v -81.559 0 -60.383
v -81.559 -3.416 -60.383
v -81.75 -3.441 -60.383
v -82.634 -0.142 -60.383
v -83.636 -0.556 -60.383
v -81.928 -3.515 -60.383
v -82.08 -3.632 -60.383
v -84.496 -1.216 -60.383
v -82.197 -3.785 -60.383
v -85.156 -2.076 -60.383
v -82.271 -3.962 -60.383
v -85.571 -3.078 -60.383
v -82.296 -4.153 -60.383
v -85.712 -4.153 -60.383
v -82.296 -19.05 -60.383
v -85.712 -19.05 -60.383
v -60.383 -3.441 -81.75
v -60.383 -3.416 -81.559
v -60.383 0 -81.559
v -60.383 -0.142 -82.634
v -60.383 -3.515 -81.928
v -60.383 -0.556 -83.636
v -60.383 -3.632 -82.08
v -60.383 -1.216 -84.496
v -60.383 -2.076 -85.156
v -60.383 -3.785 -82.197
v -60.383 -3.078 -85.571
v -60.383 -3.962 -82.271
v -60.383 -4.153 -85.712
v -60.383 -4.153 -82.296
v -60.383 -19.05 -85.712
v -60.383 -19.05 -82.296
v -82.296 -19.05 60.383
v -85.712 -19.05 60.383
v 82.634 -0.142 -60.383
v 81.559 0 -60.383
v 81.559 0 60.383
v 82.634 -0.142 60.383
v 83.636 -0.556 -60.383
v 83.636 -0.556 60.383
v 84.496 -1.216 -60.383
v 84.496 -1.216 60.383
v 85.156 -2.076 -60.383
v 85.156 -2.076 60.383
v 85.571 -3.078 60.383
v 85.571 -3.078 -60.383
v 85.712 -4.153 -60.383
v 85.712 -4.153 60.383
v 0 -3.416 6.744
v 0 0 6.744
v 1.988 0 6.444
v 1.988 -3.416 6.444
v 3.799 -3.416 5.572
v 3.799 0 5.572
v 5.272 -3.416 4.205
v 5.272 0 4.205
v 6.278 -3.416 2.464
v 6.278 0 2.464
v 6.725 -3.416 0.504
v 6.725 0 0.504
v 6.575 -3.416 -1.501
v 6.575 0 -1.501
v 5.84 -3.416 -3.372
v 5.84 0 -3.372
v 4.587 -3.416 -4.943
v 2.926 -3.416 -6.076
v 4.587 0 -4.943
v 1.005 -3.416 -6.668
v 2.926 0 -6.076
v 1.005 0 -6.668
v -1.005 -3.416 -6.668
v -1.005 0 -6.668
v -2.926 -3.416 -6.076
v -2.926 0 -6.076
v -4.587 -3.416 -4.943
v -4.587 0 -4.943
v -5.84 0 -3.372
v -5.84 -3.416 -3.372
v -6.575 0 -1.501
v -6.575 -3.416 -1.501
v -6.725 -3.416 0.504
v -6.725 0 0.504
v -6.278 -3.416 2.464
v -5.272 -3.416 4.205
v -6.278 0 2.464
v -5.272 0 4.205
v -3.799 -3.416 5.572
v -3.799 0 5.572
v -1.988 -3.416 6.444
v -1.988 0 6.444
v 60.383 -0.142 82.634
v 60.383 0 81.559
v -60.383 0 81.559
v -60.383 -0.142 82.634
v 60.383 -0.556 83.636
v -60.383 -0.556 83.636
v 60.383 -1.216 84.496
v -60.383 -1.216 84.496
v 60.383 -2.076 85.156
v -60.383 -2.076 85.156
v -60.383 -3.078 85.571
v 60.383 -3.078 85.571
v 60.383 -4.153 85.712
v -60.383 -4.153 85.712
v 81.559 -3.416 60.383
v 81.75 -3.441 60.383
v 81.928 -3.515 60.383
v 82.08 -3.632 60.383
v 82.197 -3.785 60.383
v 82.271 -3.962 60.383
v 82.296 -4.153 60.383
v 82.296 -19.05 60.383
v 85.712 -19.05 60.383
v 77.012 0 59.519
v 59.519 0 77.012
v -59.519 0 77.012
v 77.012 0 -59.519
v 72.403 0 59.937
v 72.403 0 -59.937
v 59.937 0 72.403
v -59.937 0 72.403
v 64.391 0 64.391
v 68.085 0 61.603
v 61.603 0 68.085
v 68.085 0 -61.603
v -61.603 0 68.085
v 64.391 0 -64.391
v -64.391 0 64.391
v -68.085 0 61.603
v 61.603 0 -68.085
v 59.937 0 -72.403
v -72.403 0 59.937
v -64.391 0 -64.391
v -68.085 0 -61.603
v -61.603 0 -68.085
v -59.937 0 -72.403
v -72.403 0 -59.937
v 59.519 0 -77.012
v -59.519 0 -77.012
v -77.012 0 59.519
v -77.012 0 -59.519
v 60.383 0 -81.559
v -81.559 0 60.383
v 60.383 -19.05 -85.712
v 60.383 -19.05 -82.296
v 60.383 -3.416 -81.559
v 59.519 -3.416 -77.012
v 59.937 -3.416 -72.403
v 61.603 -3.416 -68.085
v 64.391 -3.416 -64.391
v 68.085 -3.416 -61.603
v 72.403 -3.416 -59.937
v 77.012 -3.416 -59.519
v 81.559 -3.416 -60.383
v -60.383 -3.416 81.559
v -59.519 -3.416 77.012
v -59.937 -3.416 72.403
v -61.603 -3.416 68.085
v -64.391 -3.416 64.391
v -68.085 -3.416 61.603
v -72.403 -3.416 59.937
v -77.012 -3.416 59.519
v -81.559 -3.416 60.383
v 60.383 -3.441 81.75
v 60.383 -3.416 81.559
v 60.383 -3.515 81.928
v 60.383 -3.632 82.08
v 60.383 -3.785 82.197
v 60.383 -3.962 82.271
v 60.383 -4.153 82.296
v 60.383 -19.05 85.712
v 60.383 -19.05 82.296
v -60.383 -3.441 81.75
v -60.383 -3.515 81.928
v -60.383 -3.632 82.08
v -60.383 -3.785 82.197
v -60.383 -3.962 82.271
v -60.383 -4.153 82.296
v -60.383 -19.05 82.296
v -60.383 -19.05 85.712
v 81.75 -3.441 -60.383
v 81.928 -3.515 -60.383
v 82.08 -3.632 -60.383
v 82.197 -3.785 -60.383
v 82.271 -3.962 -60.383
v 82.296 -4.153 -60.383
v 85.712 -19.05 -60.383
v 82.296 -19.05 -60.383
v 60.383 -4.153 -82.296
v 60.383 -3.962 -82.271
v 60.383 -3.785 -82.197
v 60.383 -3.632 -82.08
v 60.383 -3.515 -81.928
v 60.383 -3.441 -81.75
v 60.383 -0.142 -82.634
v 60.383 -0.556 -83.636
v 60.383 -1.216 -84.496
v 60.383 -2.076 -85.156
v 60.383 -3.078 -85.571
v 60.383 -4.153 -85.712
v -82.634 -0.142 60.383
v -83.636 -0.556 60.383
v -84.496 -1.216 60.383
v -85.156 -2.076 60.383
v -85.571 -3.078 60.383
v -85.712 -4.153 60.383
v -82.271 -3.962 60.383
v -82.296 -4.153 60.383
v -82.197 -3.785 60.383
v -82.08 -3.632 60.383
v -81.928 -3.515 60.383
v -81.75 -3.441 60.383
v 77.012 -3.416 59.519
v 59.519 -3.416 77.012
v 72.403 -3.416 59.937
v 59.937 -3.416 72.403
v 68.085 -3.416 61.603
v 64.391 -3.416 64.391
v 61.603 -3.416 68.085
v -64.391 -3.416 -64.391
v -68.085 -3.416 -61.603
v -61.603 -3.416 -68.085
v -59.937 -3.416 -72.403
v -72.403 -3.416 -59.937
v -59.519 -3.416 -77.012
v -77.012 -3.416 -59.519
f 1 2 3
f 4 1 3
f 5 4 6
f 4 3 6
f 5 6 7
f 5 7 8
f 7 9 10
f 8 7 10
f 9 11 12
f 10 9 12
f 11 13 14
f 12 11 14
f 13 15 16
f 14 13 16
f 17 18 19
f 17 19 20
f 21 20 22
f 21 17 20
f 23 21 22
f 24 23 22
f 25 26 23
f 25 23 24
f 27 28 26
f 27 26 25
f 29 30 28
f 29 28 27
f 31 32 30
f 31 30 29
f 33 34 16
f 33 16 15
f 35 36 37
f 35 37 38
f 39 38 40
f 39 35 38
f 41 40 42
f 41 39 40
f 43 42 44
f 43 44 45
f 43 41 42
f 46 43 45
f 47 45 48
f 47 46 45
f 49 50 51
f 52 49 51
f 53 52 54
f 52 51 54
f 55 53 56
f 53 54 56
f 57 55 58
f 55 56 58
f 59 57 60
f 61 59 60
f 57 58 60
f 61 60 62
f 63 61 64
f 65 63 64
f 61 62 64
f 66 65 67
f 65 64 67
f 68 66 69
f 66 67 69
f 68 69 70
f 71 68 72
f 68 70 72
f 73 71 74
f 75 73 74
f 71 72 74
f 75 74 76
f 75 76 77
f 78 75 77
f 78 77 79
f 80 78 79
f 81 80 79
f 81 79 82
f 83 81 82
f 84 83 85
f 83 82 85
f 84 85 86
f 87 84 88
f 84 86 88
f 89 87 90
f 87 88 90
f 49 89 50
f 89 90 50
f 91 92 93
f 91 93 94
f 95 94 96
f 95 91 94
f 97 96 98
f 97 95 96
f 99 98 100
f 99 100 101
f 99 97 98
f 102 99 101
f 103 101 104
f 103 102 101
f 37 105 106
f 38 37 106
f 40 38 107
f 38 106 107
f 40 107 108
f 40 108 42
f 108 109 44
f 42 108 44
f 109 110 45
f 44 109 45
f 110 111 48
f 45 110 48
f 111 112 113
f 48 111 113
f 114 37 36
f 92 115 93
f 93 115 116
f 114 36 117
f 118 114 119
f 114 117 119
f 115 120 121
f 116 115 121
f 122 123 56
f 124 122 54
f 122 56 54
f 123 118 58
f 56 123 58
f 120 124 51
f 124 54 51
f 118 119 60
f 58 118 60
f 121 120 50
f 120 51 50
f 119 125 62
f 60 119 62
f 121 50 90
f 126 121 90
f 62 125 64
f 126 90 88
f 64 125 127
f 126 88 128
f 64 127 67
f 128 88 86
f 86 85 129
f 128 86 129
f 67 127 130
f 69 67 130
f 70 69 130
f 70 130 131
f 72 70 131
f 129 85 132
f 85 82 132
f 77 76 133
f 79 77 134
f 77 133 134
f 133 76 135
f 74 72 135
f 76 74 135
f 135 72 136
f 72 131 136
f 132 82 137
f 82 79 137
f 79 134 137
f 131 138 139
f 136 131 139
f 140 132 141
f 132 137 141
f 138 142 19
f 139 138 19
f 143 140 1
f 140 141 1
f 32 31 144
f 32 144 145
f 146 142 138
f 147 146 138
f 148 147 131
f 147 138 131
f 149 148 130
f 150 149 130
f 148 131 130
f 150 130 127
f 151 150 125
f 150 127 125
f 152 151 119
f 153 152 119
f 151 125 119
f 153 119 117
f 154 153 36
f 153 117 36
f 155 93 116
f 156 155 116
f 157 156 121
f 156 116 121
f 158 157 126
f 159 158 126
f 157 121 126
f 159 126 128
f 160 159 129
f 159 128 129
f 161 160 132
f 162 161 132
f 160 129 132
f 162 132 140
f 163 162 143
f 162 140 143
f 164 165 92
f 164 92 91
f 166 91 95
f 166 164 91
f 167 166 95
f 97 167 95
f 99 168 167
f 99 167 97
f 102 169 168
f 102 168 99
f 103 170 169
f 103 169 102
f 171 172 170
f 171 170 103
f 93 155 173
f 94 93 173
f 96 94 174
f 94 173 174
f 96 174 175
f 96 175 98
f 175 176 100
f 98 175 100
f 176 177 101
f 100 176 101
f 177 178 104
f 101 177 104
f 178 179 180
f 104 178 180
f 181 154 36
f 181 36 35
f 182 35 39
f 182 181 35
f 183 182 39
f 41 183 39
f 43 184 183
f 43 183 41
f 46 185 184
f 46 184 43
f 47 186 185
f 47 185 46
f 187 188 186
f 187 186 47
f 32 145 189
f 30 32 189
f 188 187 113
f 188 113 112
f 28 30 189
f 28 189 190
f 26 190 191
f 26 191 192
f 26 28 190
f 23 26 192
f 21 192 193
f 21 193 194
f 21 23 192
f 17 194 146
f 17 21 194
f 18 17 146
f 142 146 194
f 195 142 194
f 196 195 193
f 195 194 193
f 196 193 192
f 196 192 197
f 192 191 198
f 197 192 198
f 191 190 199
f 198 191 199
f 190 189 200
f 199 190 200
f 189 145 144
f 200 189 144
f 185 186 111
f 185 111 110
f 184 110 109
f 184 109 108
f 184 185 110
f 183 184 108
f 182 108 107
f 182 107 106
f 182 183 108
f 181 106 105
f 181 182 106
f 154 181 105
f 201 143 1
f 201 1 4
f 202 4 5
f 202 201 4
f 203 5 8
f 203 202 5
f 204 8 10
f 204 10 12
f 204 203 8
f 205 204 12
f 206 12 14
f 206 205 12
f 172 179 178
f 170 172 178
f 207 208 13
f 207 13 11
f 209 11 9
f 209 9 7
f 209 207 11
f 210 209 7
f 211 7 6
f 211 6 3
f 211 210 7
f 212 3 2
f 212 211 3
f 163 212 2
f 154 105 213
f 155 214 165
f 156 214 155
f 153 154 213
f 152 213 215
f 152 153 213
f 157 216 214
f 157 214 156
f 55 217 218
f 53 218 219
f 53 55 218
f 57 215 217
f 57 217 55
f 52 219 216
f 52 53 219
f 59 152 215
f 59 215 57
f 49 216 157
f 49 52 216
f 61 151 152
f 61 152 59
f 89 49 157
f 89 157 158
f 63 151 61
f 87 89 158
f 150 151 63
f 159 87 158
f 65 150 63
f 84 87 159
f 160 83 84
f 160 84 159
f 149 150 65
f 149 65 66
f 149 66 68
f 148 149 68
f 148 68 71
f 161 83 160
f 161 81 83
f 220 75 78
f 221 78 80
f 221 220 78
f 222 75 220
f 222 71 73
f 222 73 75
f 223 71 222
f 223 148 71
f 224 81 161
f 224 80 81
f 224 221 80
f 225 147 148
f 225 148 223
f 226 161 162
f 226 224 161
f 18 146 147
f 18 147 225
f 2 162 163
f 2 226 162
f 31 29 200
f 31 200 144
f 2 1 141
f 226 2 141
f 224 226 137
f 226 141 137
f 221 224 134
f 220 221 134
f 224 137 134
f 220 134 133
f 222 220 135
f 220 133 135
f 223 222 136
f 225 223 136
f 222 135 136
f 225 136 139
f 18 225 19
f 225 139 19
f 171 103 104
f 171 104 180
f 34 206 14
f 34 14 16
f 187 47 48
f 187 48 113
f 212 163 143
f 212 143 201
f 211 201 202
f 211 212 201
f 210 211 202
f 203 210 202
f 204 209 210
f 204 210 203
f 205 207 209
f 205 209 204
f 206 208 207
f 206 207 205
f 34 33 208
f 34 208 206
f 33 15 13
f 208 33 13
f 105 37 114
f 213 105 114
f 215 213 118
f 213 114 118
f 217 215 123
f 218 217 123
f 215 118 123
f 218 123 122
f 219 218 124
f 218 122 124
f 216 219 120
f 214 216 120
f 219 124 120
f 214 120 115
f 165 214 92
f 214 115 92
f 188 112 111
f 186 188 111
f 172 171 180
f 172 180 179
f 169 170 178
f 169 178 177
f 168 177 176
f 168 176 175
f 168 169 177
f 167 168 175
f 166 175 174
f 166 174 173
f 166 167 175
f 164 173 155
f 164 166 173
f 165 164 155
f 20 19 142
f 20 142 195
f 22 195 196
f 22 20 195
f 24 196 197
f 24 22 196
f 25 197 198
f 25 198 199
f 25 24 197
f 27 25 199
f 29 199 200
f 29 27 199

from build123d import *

# Parameters (mm, degrees)
SKETCH3_R                 = 6.7437
BASE_FLANGE1_DEPTH        = 3.4163
EDGE_FLANGE1_DEPTH        = 120.765617952
EDGE_FLANGE1_BEND_DEPTH   = 120.765617952
EDGE_FLANGE1_BEND_2_DEPTH = 120.765617952
EDGE_FLANGE1_BEND_3_DEPTH = 120.765617952


# Sheet-metal steps are written as plain solids
with BuildPart() as part:
    # Sketch3 → Base-Flange1 (new body)
    with BuildSketch(Plane(origin=(0, 0, 0), x_dir=(1, 0, 0), z_dir=(0, 1, 0))):
        with BuildLine():
            Line((-60.382808976, 81.5594), (60.382808976, 81.5594))
            ThreePointArc((60.382808976, 81.5594), (64.390963201, 64.390963201), (81.5594, 60.382808976))
            Line((81.5594, 60.382808976), (81.5594, -60.382808976))
            ThreePointArc((81.5594, -60.382808976), (64.390963201, -64.390963201), (60.382808976, -81.5594))
            Line((60.382808976, -81.5594), (-60.382808976, -81.5594))
            ThreePointArc((-60.382808976, -81.5594), (-64.390963201, -64.390963201), (-81.5594, -60.382808976))
            Line((-81.5594, -60.382808976), (-81.5594, 60.382808976))
            ThreePointArc((-81.5594, 60.382808976), (-64.390963201, 64.390963201), (-60.382808976, 81.5594))
        make_face()
        with Locations(Location((0, 0, 0), (0, 0, 270))):
            Circle(SKETCH3_R, mode=Mode.SUBTRACT)
    extrude(amount=-BASE_FLANGE1_DEPTH)

    # Edge-Flange1 section (across the edge) → Edge-Flange1 (add)
    with BuildSketch(Plane(origin=(60.382808976, -3.4163, 82.296), x_dir=(0, 0, -1), z_dir=(-1, 0, 0))):
        with BuildLine():
            Line((-3.4163, 0.7366), (-3.4163, 15.6337))
            Line((-3.4163, 15.6337), (0, 15.6337))
            Line((0, 15.6337), (0, 0.7366))
            ThreePointArc((0, 0.7366), (0.215745145, 0.215745145), (0.7366, 0))
            Line((0.7366, 0), (0.7366, -3.4163))
            ThreePointArc((0.7366, -3.4163), (-2.199943752, -2.199943752), (-3.4163, 0.7366))
        make_face()
    extrude(amount=EDGE_FLANGE1_DEPTH)

    # Edge-Flange1 section 2 (across the edge) → Edge-Flange1 bend (add)
    with BuildSketch(Plane(origin=(82.296, -3.4163, -60.382808976), x_dir=(-1, 0, 0), z_dir=(0, 0, 1))):
        with BuildLine():
            Line((-3.4163, 0.7366), (-3.4163, 15.6337))
            Line((-3.4163, 15.6337), (0, 15.6337))
            Line((0, 15.6337), (0, 0.7366))
            ThreePointArc((0, 0.7366), (0.215745145, 0.215745145), (0.7366, 0))
            Line((0.7366, 0), (0.7366, -3.4163))
            ThreePointArc((0.7366, -3.4163), (-2.199943752, -2.199943752), (-3.4163, 0.7366))
        make_face()
    extrude(amount=EDGE_FLANGE1_BEND_DEPTH)

    # Edge-Flange1 section 3 (across the edge) → Edge-Flange1 bend 2 (add)
    with BuildSketch(Plane(origin=(-60.382808976, -3.4163, -82.296), x_dir=(0, 0, 1), z_dir=(1, 0, 0))):
        with BuildLine():
            Line((-3.4163, 0.7366), (-3.4163, 15.6337))
            Line((-3.4163, 15.6337), (0, 15.6337))
            Line((0, 15.6337), (0, 0.7366))
            ThreePointArc((0, 0.7366), (0.215745145, 0.215745145), (0.7366, 0))
            Line((0.7366, 0), (0.7366, -3.4163))
            ThreePointArc((0.7366, -3.4163), (-2.199943752, -2.199943752), (-3.4163, 0.7366))
        make_face()
    extrude(amount=EDGE_FLANGE1_BEND_2_DEPTH)

    # Edge-Flange1 section 4 (across the edge) → Edge-Flange1 bend 3 (add)
    with BuildSketch(Plane(origin=(-82.296, -3.4163, 60.382808976), x_dir=(1, 0, 0), z_dir=(0, 0, -1))):
        with BuildLine():
            Line((-3.4163, 0.7366), (-3.4163, 15.6337))
            Line((-3.4163, 15.6337), (0, 15.6337))
            Line((0, 15.6337), (0, 0.7366))
            ThreePointArc((0, 0.7366), (0.215745145, 0.215745145), (0.7366, 0))
            Line((0.7366, 0), (0.7366, -3.4163))
            ThreePointArc((0.7366, -3.4163), (-2.199943752, -2.199943752), (-3.4163, 0.7366))
        make_face()
    extrude(amount=EDGE_FLANGE1_BEND_3_DEPTH)


solid = part.part
